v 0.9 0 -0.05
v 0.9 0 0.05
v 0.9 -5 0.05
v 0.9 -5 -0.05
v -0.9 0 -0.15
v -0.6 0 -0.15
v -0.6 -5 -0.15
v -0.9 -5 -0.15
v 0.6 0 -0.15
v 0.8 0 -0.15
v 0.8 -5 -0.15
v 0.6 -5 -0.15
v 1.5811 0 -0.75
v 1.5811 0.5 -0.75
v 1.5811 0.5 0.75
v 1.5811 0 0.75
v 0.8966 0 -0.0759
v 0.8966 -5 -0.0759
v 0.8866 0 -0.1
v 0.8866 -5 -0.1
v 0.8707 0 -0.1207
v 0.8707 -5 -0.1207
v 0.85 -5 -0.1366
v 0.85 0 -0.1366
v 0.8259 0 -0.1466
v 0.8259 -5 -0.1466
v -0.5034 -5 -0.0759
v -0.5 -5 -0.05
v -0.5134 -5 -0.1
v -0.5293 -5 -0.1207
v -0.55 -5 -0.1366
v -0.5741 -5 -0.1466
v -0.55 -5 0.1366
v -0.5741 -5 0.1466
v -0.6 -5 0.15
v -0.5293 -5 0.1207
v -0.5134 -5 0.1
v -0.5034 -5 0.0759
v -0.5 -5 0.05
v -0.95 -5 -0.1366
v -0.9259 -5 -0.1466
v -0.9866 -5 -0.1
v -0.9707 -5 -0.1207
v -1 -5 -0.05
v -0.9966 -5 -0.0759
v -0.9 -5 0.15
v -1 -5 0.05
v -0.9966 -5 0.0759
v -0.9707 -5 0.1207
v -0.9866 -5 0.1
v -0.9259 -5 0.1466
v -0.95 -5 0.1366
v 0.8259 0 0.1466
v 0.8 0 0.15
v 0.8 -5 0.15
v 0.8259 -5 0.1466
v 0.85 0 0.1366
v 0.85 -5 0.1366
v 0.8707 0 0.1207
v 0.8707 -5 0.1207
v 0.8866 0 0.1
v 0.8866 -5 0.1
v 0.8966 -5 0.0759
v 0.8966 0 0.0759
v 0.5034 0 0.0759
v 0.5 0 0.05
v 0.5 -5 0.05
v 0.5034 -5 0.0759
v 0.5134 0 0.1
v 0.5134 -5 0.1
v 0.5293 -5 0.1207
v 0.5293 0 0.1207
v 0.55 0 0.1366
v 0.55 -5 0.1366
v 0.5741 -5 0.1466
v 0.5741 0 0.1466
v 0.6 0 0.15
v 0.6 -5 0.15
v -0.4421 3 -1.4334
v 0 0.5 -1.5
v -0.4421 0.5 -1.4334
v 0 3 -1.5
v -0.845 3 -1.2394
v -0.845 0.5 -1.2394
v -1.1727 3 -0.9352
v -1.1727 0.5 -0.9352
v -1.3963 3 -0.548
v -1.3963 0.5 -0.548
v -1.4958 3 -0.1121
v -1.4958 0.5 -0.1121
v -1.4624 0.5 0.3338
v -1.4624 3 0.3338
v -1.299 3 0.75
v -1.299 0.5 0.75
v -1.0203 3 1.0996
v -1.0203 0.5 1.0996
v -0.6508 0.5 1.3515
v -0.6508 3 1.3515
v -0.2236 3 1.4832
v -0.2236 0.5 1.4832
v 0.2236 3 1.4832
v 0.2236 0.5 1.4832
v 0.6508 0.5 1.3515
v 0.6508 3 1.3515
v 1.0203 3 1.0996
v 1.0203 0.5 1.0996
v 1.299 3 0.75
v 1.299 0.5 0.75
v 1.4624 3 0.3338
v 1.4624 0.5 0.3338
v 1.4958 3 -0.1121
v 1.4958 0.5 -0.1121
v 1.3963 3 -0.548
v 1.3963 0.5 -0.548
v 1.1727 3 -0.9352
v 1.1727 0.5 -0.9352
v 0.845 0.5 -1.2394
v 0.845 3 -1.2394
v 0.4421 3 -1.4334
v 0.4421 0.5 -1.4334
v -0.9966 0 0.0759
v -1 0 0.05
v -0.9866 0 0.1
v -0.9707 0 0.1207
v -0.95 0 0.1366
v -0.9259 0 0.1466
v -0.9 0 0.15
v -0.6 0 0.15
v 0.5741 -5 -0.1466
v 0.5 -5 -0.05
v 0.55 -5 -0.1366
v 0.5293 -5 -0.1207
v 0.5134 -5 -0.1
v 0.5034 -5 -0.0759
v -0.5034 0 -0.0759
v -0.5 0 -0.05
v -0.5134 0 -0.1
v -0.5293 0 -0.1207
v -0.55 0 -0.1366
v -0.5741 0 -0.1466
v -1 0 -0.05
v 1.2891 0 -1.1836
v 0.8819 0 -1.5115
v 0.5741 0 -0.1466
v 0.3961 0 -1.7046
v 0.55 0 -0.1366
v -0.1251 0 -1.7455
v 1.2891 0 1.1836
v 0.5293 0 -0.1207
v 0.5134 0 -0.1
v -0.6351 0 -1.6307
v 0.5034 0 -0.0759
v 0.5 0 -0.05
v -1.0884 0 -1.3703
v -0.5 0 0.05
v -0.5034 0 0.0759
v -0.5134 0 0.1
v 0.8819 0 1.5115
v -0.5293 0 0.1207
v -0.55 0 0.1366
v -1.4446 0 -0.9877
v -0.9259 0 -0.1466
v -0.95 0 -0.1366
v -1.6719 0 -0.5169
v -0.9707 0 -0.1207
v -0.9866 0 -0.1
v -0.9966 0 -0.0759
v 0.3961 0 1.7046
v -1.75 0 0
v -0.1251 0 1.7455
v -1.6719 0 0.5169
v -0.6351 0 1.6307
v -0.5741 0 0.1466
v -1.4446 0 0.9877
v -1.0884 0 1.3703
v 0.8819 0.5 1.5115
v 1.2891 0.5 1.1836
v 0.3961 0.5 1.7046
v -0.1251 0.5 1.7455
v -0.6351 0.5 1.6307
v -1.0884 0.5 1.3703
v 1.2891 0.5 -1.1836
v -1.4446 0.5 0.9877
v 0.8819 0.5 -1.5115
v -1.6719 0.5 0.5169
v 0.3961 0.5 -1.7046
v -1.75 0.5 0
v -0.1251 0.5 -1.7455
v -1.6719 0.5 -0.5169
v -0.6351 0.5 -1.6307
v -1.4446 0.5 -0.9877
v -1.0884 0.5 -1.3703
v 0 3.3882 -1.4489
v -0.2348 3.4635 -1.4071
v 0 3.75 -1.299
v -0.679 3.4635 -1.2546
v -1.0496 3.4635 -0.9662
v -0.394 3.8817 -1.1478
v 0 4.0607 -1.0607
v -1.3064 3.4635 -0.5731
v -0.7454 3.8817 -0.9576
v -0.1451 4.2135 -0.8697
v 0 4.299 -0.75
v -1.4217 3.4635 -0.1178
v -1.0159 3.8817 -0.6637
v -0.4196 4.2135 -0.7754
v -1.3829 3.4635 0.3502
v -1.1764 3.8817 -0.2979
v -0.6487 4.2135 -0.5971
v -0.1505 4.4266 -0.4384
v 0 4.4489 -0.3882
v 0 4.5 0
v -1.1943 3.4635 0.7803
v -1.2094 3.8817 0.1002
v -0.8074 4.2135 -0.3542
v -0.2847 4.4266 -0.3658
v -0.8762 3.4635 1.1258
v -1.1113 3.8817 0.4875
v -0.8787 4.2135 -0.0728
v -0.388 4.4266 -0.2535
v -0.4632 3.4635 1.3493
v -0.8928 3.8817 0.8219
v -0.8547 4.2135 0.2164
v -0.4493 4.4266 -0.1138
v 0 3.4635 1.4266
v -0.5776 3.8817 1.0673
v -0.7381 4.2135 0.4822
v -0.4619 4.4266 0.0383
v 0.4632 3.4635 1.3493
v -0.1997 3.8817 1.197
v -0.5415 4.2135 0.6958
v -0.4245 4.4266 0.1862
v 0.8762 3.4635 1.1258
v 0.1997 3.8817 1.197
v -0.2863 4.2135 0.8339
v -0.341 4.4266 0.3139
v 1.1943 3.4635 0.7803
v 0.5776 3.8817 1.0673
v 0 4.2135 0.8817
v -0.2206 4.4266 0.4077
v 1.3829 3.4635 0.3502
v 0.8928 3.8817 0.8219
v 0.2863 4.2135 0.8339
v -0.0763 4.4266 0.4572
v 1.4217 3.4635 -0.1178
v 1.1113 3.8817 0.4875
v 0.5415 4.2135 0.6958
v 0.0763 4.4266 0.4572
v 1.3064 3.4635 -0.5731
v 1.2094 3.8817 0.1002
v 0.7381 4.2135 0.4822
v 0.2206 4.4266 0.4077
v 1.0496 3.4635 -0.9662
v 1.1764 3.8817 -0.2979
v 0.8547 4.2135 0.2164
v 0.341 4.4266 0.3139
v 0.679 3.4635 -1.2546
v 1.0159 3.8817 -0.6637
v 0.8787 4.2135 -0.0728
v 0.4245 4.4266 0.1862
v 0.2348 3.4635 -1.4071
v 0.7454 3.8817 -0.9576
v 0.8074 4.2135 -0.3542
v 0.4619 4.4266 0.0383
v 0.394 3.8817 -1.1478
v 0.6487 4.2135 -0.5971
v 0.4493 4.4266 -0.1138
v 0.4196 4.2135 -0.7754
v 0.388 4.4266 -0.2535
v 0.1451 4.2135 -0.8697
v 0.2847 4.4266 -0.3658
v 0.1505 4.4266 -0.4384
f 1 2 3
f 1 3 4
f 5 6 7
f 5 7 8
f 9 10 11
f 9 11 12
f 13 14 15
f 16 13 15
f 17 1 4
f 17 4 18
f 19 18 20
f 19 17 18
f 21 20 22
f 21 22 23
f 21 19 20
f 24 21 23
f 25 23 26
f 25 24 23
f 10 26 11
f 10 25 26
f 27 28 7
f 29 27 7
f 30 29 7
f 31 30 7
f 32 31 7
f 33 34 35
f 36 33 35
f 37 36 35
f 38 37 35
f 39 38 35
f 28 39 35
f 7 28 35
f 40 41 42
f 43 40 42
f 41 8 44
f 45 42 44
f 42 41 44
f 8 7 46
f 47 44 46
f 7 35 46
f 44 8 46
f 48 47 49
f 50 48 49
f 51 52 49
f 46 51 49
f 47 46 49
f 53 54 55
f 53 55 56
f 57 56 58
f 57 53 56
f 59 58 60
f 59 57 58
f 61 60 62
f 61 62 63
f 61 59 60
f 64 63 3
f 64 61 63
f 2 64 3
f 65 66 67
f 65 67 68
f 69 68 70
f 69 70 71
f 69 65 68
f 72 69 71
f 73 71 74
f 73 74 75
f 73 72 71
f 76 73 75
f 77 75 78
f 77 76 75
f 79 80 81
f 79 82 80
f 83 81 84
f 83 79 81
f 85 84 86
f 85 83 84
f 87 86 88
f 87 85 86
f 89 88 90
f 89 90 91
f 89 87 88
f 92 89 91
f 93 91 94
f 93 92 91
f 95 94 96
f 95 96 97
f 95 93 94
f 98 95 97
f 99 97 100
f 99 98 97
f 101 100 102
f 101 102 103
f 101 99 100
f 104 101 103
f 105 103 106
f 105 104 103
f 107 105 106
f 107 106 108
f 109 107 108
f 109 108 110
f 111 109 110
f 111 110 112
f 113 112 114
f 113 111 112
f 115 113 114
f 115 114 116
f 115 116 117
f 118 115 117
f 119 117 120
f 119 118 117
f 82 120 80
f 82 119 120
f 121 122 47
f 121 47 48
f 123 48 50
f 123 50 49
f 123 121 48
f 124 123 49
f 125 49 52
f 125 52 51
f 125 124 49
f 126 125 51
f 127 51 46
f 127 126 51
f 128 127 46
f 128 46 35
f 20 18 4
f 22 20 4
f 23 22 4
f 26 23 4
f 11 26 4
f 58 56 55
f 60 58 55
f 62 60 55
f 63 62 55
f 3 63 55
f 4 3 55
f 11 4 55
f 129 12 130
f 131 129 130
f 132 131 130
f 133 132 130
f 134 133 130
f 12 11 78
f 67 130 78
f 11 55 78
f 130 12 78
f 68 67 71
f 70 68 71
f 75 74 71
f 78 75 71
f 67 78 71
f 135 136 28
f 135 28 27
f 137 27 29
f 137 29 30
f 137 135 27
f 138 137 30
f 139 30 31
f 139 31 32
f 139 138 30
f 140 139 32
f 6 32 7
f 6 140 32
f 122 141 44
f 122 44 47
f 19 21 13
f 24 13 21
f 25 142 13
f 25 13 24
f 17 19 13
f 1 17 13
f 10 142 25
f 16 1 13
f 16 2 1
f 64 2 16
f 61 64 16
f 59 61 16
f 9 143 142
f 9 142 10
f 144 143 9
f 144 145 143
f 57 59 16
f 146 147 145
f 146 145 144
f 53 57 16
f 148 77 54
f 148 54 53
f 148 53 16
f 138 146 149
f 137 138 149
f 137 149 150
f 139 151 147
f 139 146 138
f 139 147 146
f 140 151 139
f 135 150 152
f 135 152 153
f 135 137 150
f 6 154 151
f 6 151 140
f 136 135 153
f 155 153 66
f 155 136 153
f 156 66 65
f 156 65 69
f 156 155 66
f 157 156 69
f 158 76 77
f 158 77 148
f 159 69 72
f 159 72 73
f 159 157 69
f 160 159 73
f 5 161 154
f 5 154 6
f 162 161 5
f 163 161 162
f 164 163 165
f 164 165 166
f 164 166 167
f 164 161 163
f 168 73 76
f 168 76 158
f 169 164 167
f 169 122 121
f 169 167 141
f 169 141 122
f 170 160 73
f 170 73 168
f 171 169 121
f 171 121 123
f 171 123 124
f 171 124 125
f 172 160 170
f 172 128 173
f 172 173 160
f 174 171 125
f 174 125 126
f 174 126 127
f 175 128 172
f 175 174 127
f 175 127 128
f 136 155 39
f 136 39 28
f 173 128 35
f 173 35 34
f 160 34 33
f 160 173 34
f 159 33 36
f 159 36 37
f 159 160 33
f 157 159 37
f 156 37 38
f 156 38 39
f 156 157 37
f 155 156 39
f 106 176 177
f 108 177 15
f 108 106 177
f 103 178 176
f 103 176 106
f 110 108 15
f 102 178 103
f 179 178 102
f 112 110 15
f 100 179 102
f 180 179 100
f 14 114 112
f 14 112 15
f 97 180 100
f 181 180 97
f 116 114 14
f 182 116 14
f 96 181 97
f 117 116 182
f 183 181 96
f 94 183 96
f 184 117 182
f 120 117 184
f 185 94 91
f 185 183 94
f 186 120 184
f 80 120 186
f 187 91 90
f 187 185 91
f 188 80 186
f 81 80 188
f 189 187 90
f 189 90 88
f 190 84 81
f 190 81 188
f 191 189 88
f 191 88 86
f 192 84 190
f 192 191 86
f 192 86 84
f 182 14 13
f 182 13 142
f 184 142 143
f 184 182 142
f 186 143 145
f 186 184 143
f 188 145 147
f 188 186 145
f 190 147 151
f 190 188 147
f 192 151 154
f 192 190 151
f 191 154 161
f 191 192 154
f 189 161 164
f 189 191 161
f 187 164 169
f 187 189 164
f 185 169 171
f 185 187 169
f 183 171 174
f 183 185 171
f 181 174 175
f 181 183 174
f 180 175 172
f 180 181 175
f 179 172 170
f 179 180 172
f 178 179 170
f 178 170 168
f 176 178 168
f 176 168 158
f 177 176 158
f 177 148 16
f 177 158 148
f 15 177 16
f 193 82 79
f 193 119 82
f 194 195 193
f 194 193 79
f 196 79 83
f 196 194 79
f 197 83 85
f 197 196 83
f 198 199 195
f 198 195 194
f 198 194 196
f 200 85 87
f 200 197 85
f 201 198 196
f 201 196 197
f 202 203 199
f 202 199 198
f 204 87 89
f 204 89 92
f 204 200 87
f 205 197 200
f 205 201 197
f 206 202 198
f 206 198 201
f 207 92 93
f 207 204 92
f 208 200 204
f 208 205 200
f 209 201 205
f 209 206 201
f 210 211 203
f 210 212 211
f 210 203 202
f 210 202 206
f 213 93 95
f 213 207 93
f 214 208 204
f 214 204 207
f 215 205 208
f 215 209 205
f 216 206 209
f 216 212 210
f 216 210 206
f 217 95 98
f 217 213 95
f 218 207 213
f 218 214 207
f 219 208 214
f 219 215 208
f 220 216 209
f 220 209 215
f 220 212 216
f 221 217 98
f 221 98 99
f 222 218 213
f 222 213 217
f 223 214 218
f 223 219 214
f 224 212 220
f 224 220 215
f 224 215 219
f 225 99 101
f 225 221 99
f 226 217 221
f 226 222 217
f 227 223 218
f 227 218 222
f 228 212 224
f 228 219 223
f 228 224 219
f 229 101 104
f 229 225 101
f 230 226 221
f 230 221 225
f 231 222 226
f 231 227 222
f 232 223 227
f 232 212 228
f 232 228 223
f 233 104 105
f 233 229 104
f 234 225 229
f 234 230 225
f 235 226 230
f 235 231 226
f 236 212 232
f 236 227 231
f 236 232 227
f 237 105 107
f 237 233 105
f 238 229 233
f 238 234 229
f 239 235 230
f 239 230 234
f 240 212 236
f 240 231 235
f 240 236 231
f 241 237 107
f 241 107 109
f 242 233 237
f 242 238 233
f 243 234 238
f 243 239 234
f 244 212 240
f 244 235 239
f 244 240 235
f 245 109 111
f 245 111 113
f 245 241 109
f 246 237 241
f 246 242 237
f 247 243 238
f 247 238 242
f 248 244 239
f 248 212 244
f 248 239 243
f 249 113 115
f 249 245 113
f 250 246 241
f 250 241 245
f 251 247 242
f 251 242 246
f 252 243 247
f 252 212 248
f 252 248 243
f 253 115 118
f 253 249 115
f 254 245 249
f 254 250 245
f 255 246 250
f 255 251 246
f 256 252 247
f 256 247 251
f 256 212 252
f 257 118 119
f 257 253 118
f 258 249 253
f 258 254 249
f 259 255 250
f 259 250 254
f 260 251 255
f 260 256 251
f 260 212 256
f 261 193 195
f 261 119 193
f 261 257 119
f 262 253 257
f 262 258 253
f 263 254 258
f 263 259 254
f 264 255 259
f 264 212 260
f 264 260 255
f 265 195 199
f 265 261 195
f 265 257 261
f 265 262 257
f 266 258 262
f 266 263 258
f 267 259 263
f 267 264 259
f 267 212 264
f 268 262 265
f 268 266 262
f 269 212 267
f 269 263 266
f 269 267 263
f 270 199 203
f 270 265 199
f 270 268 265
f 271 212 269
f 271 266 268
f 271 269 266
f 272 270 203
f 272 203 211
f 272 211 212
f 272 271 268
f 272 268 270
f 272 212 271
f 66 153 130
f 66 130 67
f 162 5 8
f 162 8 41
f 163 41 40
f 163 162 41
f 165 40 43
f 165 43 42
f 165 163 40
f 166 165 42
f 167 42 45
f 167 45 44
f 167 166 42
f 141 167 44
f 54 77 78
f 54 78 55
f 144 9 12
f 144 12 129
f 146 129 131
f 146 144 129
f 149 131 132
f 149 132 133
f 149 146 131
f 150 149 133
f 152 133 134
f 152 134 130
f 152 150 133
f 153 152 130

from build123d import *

# Parameters (mm, degrees)
SCHNITT_LINEAR_START            = -1
SCHNITT_LINEAR_AUSTRAGEN1_DEPTH = 1
LINEAR_AUSTRAGEN1_DEPTH         = 5


with BuildPart() as part:
    # Skizze2 → Rotation1 (revolve)
    with BuildSketch(Plane.XY, mode=Mode.PRIVATE) as rotation1_sk:
        with BuildLine():
            Line((0, 0), (-1.75, 0))
            Line((-1.75, 0), (-1.75, 0.5))
            Line((-1.75, 0.5), (-1.5, 0.5))
            Line((-1.5, 0.5), (-1.5, 3))
            ThreePointArc((-1.5, 3), (-1.060660172, 4.060660172), (0, 4.5))
            Line((0, 4.5), (0, 0))
        make_face()
    revolve(rotation1_sk.sketch.rotate(Axis((0, 0, 0), (0, 1, 0)), 270), axis=Axis((0, 0, 0), (0, 1, 0)))

    # Skizze3 → Schnitt-Linear austragen1 (cut)
    with BuildSketch(Plane.XZ.offset(SCHNITT_LINEAR_START)):
        with BuildLine():
            Line((1.58113883, -0.75), (1.58113883, 0.75))
            ThreePointArc((1.58113883, 0.75), (1.75, 0), (1.58113883, -0.75))
        make_face()
    extrude(amount=SCHNITT_LINEAR_AUSTRAGEN1_DEPTH, mode=Mode.SUBTRACT)

    # Skizze4 → Linear austragen1 (add)
    with BuildSketch(Plane.XZ):
        with BuildLine():
            Line((0.6, 0.15), (0.8, 0.15))
            ThreePointArc((0.8, 0.15), (0.870710678, 0.120710678), (0.9, 0.05))
            Line((0.9, 0.05), (0.9, -0.05))
            ThreePointArc((0.9, -0.05), (0.870710678, -0.120710678), (0.8, -0.15))
            Line((0.8, -0.15), (0.6, -0.15))
            ThreePointArc((0.6, -0.15), (0.529289322, -0.120710678), (0.5, -0.05))
            Line((0.5, -0.05), (0.5, 0.05))
            ThreePointArc((0.5, 0.05), (0.529289322, 0.120710678), (0.6, 0.15))
        make_face()
        with BuildLine():
            Line((-0.9, 0.15), (-0.6, 0.15))
            ThreePointArc((-0.6, 0.15), (-0.529289322, 0.120710678), (-0.5, 0.05))
            Line((-0.5, 0.05), (-0.5, -0.05))
            ThreePointArc((-0.5, -0.05), (-0.529289322, -0.120710678), (-0.6, -0.15))
            Line((-0.6, -0.15), (-0.9, -0.15))
            ThreePointArc((-0.9, -0.15), (-0.970710678, -0.120710678), (-1, -0.05))
            Line((-1, -0.05), (-1, 0.05))
            ThreePointArc((-1, 0.05), (-0.970710678, 0.120710678), (-0.9, 0.15))
        make_face()
    extrude(amount=LINEAR_AUSTRAGEN1_DEPTH)


solid = part.part
